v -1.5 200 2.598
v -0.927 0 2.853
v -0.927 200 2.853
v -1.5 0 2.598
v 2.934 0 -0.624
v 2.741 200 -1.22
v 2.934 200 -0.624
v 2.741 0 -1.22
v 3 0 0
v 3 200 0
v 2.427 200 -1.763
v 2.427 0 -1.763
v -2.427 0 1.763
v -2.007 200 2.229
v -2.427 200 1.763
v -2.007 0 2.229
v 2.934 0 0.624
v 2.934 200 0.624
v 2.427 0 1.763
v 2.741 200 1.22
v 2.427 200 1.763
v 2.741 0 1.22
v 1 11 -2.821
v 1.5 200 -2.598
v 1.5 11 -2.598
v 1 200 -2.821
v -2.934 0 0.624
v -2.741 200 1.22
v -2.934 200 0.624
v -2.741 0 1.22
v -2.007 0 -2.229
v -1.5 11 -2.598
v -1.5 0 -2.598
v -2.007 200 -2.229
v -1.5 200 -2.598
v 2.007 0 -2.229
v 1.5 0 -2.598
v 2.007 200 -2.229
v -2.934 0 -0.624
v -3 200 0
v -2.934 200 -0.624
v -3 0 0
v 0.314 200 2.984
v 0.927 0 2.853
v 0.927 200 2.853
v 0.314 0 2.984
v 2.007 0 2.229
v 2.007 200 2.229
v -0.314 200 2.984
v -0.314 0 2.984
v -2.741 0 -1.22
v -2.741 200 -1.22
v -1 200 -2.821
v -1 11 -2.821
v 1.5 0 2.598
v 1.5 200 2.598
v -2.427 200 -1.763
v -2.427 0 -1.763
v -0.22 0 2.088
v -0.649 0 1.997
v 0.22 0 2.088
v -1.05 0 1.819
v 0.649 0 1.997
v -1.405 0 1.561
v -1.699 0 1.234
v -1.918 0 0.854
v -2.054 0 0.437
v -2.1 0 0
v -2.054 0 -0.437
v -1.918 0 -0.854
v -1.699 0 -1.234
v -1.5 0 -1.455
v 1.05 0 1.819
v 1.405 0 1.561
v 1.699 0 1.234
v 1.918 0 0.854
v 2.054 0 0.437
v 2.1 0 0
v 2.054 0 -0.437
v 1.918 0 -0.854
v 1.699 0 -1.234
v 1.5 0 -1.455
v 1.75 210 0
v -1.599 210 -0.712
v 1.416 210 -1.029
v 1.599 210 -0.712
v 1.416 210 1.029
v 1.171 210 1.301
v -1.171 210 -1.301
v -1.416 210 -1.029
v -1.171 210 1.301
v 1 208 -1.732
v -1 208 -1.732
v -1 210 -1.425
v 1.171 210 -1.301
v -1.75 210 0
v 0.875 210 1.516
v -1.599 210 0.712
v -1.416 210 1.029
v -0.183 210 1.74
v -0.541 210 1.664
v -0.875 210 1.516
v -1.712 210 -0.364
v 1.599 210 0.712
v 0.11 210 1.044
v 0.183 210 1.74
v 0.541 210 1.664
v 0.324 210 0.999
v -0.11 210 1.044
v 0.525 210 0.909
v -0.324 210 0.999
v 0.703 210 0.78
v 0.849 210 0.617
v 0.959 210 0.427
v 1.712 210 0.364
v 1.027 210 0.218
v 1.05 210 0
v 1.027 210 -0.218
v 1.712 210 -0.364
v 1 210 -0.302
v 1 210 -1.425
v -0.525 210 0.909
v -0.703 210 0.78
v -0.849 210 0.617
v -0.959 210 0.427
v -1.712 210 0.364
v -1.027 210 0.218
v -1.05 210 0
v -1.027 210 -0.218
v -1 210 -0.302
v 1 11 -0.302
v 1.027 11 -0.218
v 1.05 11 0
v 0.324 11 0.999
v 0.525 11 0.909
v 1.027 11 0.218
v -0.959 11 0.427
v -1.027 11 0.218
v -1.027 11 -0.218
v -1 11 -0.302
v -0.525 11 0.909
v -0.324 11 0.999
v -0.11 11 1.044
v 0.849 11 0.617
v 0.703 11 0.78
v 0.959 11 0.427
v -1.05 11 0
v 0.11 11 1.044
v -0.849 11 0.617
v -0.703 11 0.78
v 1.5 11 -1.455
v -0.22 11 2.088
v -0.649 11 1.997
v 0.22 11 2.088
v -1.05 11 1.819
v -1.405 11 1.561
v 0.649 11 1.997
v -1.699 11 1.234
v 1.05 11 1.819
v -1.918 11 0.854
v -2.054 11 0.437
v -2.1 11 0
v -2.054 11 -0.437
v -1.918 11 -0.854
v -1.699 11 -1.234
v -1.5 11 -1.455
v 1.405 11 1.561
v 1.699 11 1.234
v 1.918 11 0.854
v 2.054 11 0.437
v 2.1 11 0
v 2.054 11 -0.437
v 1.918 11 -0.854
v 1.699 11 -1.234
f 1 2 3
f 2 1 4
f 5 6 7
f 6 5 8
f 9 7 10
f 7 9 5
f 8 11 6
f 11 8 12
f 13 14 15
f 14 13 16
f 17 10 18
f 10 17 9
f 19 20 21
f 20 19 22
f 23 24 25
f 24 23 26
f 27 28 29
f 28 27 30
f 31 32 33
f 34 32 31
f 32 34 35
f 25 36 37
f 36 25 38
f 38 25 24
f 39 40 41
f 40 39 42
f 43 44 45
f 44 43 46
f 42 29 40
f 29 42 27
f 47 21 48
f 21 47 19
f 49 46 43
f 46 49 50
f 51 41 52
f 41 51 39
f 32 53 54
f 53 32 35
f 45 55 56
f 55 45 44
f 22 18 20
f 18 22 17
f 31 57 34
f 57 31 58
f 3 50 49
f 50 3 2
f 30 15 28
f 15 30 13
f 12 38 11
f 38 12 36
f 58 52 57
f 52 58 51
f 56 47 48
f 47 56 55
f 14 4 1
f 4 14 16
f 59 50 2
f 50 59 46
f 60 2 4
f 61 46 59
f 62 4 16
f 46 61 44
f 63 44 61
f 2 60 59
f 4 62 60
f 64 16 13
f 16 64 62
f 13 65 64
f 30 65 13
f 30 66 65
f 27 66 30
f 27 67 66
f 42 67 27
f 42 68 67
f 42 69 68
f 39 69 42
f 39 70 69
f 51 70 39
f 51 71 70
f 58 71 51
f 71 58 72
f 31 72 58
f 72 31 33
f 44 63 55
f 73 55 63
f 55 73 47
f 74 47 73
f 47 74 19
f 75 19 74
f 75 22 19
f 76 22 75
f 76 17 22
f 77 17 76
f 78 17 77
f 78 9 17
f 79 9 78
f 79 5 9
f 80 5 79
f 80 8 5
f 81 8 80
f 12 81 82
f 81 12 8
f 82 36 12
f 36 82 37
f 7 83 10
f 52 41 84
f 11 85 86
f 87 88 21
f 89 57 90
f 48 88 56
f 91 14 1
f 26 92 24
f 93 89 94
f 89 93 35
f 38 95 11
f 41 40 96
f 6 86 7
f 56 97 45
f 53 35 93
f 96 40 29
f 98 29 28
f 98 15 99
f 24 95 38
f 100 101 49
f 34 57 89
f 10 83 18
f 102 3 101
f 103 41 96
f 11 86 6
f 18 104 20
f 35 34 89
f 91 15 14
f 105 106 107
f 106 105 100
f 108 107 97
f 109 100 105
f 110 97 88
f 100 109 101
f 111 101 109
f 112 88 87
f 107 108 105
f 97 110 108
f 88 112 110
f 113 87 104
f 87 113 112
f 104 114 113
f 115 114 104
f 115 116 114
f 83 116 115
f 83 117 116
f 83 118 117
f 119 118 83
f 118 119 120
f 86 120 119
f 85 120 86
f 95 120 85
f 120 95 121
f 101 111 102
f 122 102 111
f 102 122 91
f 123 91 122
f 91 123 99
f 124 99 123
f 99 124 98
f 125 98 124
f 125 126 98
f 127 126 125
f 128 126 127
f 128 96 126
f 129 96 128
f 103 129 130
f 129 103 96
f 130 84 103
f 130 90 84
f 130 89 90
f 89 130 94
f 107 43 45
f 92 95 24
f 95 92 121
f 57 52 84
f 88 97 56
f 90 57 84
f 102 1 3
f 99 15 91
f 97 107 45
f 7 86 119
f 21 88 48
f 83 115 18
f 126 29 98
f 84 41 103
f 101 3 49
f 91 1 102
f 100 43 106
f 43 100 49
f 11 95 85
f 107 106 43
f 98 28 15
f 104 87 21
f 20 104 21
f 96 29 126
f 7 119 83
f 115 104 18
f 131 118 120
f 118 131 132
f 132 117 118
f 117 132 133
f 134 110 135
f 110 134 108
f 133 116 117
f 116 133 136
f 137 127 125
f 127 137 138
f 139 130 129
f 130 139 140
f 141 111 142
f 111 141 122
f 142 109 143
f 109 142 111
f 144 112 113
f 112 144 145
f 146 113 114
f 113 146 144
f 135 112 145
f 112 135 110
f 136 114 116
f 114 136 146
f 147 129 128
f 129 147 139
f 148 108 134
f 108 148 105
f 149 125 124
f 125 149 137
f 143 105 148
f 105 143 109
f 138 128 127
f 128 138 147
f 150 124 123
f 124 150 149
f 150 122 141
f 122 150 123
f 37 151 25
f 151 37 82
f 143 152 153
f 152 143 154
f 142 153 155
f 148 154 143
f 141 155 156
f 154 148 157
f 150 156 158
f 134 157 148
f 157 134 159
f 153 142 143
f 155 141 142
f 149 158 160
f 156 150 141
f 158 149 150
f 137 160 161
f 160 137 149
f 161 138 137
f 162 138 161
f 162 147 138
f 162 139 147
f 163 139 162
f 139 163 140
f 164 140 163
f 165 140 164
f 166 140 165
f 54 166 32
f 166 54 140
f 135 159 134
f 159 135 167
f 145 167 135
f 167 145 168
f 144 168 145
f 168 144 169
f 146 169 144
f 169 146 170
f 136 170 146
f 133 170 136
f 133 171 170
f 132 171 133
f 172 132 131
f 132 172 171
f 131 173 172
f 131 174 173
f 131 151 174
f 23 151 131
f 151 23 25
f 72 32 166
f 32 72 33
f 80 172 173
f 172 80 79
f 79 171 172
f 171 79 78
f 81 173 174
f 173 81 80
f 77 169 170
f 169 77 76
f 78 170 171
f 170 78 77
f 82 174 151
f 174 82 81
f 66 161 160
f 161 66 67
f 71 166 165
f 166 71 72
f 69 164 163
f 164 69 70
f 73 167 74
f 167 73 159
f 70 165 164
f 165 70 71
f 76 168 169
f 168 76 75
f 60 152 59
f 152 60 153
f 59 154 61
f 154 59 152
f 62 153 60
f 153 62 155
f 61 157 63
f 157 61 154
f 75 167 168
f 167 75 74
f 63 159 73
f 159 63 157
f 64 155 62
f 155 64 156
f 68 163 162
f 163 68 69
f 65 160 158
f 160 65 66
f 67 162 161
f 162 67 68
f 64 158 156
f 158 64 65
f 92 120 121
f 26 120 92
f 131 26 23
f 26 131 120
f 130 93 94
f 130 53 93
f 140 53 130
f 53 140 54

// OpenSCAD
$fn = 30;

length = 200;
thickness = 6;

rotate([-90, 0, 0]) {
    difference() {
        translate([0, 0, 0]) {
            cylinder(d = thickness, h = length);
            translate([0, 0, length]) cylinder(d1 = thickness, d2 = 3.5, h = 10);
        }
        translate([0, 0, -1]) spoke();
        translate([-1.5, 0, -2]) cube([3, 8, 13]);
        translate([0, 0, -1]) nippel();
        translate([-1, 0, -2]) cube([2, 8, 300]);
    }
}

module nippel() {
    cylinder(d = 4.2, h = 12);
}

module spoke() {
    cylinder(d = 2.1, h = 300);
}
